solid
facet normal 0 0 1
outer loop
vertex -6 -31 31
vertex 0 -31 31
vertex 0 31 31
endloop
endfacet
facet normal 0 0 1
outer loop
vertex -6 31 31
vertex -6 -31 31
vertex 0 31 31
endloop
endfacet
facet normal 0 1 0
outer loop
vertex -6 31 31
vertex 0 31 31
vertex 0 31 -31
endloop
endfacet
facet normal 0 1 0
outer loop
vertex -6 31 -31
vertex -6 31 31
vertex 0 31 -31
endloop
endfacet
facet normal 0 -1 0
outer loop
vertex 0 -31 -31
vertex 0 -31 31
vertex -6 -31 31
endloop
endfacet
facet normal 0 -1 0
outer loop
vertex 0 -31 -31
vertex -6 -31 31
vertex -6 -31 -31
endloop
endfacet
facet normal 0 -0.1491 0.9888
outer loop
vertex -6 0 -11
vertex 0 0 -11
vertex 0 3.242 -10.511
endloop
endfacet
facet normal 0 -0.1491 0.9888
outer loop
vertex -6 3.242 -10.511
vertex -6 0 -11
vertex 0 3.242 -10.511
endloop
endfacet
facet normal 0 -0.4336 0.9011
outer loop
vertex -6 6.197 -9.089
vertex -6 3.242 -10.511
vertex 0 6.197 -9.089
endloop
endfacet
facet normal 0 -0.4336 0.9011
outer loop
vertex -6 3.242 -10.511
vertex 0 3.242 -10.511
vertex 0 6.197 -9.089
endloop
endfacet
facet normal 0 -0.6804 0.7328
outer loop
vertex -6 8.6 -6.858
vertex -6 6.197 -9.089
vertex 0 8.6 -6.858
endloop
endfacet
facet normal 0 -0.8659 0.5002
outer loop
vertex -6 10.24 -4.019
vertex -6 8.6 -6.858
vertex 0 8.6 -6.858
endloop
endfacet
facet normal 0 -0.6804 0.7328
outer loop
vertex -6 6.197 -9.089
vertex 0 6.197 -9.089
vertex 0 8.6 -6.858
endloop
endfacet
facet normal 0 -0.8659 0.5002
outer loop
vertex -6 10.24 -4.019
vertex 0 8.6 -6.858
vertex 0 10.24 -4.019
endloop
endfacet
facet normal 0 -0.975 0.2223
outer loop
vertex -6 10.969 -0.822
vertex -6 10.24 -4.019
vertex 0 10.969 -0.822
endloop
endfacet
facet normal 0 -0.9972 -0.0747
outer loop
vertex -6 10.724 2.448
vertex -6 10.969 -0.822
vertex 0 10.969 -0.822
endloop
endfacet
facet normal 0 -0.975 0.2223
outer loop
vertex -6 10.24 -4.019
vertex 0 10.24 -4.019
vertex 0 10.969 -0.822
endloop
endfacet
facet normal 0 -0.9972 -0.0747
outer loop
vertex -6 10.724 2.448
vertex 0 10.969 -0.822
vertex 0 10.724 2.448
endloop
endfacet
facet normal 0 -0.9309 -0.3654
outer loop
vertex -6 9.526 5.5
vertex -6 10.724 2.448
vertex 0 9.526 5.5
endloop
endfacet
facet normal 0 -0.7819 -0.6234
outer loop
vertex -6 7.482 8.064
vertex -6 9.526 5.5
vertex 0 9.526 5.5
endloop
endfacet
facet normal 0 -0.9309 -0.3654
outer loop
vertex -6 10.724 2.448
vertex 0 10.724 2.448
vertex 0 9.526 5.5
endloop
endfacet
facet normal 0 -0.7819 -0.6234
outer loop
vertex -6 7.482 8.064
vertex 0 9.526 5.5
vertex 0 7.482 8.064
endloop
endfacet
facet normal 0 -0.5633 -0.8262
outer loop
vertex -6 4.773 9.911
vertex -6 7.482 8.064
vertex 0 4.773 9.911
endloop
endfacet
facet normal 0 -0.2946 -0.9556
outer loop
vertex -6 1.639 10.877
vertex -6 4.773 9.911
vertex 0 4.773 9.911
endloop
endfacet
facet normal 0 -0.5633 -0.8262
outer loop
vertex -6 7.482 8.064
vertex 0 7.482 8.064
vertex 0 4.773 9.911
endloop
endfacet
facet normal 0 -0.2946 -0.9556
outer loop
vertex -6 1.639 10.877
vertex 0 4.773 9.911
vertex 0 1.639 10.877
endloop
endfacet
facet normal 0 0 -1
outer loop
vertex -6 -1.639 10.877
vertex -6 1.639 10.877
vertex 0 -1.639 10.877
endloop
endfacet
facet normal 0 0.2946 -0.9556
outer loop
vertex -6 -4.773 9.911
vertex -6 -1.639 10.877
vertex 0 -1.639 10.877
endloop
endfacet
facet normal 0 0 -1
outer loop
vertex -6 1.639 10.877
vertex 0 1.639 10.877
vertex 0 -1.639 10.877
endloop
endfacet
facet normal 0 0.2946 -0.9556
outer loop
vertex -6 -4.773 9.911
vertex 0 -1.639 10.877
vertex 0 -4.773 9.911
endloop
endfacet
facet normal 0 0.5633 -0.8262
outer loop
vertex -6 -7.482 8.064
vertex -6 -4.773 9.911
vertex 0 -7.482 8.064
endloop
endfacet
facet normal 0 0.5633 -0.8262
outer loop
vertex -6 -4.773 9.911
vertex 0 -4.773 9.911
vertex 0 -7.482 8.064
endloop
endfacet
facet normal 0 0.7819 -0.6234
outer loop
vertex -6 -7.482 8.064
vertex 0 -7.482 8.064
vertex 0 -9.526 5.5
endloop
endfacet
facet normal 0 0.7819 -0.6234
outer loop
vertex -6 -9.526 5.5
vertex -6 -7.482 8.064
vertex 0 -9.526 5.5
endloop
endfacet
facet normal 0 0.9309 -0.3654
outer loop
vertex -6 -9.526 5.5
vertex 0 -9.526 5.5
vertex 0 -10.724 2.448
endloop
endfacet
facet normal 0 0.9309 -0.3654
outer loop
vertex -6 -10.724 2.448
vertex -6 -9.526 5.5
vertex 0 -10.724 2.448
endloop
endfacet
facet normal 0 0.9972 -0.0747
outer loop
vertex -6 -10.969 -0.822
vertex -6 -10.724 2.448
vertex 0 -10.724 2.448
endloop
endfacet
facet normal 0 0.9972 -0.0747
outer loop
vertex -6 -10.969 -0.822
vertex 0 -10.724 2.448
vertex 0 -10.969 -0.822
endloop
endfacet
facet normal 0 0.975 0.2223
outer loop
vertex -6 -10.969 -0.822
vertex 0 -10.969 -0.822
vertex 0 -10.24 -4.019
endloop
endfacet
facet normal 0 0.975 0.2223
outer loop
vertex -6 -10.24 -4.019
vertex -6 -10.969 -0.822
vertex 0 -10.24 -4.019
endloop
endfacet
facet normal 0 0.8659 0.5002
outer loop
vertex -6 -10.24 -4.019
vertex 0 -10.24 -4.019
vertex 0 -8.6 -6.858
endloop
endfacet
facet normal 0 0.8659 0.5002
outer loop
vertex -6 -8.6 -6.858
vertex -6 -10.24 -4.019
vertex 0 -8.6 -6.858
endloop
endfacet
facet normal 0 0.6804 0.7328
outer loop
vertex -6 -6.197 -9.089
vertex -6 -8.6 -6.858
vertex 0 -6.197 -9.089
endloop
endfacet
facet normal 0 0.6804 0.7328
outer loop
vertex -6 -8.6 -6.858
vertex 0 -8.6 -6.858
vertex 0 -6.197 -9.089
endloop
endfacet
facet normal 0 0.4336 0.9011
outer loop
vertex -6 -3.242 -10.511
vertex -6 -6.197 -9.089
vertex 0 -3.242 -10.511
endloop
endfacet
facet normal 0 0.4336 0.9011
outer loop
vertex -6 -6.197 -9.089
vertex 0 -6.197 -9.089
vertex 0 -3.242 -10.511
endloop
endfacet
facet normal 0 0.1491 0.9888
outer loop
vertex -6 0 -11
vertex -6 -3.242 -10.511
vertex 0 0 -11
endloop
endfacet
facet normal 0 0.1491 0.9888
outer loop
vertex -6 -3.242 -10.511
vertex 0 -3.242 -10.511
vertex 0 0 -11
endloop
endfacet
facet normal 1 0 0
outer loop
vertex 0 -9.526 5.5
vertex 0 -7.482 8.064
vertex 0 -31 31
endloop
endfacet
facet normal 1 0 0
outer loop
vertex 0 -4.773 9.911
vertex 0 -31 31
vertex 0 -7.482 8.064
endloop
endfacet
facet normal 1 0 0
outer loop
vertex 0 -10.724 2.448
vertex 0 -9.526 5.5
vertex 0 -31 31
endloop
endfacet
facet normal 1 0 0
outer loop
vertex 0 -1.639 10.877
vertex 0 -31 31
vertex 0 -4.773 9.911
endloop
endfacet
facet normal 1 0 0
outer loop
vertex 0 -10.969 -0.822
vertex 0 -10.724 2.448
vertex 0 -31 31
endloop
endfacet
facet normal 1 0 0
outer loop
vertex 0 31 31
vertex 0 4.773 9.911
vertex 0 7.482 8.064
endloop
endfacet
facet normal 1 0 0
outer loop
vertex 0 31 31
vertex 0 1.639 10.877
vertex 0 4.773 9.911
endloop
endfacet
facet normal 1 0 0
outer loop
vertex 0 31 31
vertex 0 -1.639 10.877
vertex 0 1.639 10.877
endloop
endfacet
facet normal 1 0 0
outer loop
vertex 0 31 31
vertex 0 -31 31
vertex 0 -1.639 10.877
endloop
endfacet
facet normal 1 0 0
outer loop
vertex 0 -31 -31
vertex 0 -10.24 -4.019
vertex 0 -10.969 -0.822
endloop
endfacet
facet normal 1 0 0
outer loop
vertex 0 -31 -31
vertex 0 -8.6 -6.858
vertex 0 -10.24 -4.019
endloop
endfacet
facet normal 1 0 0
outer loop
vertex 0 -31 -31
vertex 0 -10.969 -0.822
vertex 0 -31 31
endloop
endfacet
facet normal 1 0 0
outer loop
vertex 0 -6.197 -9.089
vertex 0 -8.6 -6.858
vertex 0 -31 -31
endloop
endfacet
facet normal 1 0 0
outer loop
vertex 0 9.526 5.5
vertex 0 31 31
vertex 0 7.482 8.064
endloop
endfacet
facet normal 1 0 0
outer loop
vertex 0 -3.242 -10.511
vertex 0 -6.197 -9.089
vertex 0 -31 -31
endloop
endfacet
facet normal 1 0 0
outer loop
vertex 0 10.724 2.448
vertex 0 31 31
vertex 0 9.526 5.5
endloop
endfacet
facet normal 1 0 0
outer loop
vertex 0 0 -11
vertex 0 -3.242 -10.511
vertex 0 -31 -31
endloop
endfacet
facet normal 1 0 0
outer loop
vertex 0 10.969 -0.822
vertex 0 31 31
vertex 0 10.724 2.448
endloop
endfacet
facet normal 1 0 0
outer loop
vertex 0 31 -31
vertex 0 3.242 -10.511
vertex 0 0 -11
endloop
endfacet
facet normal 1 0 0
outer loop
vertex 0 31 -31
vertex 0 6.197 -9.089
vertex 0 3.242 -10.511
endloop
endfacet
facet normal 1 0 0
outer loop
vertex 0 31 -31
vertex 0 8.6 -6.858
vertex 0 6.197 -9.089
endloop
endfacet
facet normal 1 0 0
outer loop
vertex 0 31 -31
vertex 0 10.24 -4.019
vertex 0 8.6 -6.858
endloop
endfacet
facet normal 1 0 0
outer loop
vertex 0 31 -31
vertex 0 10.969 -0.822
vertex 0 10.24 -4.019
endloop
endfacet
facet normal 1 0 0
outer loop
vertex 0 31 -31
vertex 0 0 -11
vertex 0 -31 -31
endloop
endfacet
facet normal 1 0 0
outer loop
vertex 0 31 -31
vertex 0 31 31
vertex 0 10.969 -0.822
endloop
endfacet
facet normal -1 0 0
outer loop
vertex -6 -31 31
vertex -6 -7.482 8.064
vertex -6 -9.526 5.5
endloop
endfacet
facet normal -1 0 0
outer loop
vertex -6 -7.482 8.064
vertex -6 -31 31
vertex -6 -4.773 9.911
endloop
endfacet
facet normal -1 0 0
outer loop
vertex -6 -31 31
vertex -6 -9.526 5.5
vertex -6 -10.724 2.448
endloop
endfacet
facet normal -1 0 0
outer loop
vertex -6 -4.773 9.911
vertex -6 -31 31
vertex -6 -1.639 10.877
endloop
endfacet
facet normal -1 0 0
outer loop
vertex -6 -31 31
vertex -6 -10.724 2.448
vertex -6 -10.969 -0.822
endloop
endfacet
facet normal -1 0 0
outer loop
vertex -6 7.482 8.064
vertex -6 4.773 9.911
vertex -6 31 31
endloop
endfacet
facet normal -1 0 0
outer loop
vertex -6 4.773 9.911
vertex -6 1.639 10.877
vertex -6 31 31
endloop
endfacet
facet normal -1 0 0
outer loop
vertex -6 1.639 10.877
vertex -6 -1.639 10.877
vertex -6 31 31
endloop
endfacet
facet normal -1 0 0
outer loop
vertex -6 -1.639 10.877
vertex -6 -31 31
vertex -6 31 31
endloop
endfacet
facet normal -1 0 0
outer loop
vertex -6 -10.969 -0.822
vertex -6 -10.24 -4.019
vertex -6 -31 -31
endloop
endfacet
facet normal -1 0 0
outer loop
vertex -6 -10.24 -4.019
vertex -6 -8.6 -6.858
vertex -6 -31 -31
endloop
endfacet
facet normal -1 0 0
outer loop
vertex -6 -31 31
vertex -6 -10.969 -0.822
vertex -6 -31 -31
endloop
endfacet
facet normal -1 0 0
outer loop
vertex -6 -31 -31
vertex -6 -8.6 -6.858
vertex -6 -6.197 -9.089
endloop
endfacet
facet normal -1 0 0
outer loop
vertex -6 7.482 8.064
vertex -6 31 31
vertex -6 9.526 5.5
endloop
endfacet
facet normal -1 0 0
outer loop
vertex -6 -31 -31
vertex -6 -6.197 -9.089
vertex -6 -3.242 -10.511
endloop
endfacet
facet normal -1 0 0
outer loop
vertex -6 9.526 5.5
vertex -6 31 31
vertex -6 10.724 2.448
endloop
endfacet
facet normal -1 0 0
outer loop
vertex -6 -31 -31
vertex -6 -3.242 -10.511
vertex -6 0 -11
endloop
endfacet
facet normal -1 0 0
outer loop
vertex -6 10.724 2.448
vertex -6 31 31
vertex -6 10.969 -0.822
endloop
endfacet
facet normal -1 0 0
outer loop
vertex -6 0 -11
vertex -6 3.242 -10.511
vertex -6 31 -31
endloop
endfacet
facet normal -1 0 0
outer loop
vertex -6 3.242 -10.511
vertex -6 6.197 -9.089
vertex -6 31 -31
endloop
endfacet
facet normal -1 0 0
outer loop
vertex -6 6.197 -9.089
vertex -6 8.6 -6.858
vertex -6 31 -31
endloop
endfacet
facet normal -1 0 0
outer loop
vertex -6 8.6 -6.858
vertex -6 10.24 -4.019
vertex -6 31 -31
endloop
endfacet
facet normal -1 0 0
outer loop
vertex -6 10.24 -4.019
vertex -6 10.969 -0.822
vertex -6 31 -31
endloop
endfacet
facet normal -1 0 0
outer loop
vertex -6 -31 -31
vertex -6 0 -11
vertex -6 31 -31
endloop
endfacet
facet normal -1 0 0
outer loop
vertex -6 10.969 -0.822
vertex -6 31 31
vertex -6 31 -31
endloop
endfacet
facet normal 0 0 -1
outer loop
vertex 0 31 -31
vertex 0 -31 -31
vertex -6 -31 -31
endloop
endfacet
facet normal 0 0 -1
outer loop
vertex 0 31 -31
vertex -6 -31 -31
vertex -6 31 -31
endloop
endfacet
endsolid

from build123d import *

# Parameters (mm, degrees)
SKETCH1_W  = 62
SKETCH1_H  = 62
SKETCH1_R  = 11
BODY_DEPTH = 6


with BuildPart() as part:
    # Sketch1 → Body (new body)
    with BuildSketch(Plane(origin=(0, 0, 0), x_dir=(0, 0, -1), z_dir=(1, 0, 0))):
        Rectangle(SKETCH1_W, SKETCH1_H)
        Circle(SKETCH1_R, mode=Mode.SUBTRACT)
    extrude(amount=-BODY_DEPTH)


solid = part.part
